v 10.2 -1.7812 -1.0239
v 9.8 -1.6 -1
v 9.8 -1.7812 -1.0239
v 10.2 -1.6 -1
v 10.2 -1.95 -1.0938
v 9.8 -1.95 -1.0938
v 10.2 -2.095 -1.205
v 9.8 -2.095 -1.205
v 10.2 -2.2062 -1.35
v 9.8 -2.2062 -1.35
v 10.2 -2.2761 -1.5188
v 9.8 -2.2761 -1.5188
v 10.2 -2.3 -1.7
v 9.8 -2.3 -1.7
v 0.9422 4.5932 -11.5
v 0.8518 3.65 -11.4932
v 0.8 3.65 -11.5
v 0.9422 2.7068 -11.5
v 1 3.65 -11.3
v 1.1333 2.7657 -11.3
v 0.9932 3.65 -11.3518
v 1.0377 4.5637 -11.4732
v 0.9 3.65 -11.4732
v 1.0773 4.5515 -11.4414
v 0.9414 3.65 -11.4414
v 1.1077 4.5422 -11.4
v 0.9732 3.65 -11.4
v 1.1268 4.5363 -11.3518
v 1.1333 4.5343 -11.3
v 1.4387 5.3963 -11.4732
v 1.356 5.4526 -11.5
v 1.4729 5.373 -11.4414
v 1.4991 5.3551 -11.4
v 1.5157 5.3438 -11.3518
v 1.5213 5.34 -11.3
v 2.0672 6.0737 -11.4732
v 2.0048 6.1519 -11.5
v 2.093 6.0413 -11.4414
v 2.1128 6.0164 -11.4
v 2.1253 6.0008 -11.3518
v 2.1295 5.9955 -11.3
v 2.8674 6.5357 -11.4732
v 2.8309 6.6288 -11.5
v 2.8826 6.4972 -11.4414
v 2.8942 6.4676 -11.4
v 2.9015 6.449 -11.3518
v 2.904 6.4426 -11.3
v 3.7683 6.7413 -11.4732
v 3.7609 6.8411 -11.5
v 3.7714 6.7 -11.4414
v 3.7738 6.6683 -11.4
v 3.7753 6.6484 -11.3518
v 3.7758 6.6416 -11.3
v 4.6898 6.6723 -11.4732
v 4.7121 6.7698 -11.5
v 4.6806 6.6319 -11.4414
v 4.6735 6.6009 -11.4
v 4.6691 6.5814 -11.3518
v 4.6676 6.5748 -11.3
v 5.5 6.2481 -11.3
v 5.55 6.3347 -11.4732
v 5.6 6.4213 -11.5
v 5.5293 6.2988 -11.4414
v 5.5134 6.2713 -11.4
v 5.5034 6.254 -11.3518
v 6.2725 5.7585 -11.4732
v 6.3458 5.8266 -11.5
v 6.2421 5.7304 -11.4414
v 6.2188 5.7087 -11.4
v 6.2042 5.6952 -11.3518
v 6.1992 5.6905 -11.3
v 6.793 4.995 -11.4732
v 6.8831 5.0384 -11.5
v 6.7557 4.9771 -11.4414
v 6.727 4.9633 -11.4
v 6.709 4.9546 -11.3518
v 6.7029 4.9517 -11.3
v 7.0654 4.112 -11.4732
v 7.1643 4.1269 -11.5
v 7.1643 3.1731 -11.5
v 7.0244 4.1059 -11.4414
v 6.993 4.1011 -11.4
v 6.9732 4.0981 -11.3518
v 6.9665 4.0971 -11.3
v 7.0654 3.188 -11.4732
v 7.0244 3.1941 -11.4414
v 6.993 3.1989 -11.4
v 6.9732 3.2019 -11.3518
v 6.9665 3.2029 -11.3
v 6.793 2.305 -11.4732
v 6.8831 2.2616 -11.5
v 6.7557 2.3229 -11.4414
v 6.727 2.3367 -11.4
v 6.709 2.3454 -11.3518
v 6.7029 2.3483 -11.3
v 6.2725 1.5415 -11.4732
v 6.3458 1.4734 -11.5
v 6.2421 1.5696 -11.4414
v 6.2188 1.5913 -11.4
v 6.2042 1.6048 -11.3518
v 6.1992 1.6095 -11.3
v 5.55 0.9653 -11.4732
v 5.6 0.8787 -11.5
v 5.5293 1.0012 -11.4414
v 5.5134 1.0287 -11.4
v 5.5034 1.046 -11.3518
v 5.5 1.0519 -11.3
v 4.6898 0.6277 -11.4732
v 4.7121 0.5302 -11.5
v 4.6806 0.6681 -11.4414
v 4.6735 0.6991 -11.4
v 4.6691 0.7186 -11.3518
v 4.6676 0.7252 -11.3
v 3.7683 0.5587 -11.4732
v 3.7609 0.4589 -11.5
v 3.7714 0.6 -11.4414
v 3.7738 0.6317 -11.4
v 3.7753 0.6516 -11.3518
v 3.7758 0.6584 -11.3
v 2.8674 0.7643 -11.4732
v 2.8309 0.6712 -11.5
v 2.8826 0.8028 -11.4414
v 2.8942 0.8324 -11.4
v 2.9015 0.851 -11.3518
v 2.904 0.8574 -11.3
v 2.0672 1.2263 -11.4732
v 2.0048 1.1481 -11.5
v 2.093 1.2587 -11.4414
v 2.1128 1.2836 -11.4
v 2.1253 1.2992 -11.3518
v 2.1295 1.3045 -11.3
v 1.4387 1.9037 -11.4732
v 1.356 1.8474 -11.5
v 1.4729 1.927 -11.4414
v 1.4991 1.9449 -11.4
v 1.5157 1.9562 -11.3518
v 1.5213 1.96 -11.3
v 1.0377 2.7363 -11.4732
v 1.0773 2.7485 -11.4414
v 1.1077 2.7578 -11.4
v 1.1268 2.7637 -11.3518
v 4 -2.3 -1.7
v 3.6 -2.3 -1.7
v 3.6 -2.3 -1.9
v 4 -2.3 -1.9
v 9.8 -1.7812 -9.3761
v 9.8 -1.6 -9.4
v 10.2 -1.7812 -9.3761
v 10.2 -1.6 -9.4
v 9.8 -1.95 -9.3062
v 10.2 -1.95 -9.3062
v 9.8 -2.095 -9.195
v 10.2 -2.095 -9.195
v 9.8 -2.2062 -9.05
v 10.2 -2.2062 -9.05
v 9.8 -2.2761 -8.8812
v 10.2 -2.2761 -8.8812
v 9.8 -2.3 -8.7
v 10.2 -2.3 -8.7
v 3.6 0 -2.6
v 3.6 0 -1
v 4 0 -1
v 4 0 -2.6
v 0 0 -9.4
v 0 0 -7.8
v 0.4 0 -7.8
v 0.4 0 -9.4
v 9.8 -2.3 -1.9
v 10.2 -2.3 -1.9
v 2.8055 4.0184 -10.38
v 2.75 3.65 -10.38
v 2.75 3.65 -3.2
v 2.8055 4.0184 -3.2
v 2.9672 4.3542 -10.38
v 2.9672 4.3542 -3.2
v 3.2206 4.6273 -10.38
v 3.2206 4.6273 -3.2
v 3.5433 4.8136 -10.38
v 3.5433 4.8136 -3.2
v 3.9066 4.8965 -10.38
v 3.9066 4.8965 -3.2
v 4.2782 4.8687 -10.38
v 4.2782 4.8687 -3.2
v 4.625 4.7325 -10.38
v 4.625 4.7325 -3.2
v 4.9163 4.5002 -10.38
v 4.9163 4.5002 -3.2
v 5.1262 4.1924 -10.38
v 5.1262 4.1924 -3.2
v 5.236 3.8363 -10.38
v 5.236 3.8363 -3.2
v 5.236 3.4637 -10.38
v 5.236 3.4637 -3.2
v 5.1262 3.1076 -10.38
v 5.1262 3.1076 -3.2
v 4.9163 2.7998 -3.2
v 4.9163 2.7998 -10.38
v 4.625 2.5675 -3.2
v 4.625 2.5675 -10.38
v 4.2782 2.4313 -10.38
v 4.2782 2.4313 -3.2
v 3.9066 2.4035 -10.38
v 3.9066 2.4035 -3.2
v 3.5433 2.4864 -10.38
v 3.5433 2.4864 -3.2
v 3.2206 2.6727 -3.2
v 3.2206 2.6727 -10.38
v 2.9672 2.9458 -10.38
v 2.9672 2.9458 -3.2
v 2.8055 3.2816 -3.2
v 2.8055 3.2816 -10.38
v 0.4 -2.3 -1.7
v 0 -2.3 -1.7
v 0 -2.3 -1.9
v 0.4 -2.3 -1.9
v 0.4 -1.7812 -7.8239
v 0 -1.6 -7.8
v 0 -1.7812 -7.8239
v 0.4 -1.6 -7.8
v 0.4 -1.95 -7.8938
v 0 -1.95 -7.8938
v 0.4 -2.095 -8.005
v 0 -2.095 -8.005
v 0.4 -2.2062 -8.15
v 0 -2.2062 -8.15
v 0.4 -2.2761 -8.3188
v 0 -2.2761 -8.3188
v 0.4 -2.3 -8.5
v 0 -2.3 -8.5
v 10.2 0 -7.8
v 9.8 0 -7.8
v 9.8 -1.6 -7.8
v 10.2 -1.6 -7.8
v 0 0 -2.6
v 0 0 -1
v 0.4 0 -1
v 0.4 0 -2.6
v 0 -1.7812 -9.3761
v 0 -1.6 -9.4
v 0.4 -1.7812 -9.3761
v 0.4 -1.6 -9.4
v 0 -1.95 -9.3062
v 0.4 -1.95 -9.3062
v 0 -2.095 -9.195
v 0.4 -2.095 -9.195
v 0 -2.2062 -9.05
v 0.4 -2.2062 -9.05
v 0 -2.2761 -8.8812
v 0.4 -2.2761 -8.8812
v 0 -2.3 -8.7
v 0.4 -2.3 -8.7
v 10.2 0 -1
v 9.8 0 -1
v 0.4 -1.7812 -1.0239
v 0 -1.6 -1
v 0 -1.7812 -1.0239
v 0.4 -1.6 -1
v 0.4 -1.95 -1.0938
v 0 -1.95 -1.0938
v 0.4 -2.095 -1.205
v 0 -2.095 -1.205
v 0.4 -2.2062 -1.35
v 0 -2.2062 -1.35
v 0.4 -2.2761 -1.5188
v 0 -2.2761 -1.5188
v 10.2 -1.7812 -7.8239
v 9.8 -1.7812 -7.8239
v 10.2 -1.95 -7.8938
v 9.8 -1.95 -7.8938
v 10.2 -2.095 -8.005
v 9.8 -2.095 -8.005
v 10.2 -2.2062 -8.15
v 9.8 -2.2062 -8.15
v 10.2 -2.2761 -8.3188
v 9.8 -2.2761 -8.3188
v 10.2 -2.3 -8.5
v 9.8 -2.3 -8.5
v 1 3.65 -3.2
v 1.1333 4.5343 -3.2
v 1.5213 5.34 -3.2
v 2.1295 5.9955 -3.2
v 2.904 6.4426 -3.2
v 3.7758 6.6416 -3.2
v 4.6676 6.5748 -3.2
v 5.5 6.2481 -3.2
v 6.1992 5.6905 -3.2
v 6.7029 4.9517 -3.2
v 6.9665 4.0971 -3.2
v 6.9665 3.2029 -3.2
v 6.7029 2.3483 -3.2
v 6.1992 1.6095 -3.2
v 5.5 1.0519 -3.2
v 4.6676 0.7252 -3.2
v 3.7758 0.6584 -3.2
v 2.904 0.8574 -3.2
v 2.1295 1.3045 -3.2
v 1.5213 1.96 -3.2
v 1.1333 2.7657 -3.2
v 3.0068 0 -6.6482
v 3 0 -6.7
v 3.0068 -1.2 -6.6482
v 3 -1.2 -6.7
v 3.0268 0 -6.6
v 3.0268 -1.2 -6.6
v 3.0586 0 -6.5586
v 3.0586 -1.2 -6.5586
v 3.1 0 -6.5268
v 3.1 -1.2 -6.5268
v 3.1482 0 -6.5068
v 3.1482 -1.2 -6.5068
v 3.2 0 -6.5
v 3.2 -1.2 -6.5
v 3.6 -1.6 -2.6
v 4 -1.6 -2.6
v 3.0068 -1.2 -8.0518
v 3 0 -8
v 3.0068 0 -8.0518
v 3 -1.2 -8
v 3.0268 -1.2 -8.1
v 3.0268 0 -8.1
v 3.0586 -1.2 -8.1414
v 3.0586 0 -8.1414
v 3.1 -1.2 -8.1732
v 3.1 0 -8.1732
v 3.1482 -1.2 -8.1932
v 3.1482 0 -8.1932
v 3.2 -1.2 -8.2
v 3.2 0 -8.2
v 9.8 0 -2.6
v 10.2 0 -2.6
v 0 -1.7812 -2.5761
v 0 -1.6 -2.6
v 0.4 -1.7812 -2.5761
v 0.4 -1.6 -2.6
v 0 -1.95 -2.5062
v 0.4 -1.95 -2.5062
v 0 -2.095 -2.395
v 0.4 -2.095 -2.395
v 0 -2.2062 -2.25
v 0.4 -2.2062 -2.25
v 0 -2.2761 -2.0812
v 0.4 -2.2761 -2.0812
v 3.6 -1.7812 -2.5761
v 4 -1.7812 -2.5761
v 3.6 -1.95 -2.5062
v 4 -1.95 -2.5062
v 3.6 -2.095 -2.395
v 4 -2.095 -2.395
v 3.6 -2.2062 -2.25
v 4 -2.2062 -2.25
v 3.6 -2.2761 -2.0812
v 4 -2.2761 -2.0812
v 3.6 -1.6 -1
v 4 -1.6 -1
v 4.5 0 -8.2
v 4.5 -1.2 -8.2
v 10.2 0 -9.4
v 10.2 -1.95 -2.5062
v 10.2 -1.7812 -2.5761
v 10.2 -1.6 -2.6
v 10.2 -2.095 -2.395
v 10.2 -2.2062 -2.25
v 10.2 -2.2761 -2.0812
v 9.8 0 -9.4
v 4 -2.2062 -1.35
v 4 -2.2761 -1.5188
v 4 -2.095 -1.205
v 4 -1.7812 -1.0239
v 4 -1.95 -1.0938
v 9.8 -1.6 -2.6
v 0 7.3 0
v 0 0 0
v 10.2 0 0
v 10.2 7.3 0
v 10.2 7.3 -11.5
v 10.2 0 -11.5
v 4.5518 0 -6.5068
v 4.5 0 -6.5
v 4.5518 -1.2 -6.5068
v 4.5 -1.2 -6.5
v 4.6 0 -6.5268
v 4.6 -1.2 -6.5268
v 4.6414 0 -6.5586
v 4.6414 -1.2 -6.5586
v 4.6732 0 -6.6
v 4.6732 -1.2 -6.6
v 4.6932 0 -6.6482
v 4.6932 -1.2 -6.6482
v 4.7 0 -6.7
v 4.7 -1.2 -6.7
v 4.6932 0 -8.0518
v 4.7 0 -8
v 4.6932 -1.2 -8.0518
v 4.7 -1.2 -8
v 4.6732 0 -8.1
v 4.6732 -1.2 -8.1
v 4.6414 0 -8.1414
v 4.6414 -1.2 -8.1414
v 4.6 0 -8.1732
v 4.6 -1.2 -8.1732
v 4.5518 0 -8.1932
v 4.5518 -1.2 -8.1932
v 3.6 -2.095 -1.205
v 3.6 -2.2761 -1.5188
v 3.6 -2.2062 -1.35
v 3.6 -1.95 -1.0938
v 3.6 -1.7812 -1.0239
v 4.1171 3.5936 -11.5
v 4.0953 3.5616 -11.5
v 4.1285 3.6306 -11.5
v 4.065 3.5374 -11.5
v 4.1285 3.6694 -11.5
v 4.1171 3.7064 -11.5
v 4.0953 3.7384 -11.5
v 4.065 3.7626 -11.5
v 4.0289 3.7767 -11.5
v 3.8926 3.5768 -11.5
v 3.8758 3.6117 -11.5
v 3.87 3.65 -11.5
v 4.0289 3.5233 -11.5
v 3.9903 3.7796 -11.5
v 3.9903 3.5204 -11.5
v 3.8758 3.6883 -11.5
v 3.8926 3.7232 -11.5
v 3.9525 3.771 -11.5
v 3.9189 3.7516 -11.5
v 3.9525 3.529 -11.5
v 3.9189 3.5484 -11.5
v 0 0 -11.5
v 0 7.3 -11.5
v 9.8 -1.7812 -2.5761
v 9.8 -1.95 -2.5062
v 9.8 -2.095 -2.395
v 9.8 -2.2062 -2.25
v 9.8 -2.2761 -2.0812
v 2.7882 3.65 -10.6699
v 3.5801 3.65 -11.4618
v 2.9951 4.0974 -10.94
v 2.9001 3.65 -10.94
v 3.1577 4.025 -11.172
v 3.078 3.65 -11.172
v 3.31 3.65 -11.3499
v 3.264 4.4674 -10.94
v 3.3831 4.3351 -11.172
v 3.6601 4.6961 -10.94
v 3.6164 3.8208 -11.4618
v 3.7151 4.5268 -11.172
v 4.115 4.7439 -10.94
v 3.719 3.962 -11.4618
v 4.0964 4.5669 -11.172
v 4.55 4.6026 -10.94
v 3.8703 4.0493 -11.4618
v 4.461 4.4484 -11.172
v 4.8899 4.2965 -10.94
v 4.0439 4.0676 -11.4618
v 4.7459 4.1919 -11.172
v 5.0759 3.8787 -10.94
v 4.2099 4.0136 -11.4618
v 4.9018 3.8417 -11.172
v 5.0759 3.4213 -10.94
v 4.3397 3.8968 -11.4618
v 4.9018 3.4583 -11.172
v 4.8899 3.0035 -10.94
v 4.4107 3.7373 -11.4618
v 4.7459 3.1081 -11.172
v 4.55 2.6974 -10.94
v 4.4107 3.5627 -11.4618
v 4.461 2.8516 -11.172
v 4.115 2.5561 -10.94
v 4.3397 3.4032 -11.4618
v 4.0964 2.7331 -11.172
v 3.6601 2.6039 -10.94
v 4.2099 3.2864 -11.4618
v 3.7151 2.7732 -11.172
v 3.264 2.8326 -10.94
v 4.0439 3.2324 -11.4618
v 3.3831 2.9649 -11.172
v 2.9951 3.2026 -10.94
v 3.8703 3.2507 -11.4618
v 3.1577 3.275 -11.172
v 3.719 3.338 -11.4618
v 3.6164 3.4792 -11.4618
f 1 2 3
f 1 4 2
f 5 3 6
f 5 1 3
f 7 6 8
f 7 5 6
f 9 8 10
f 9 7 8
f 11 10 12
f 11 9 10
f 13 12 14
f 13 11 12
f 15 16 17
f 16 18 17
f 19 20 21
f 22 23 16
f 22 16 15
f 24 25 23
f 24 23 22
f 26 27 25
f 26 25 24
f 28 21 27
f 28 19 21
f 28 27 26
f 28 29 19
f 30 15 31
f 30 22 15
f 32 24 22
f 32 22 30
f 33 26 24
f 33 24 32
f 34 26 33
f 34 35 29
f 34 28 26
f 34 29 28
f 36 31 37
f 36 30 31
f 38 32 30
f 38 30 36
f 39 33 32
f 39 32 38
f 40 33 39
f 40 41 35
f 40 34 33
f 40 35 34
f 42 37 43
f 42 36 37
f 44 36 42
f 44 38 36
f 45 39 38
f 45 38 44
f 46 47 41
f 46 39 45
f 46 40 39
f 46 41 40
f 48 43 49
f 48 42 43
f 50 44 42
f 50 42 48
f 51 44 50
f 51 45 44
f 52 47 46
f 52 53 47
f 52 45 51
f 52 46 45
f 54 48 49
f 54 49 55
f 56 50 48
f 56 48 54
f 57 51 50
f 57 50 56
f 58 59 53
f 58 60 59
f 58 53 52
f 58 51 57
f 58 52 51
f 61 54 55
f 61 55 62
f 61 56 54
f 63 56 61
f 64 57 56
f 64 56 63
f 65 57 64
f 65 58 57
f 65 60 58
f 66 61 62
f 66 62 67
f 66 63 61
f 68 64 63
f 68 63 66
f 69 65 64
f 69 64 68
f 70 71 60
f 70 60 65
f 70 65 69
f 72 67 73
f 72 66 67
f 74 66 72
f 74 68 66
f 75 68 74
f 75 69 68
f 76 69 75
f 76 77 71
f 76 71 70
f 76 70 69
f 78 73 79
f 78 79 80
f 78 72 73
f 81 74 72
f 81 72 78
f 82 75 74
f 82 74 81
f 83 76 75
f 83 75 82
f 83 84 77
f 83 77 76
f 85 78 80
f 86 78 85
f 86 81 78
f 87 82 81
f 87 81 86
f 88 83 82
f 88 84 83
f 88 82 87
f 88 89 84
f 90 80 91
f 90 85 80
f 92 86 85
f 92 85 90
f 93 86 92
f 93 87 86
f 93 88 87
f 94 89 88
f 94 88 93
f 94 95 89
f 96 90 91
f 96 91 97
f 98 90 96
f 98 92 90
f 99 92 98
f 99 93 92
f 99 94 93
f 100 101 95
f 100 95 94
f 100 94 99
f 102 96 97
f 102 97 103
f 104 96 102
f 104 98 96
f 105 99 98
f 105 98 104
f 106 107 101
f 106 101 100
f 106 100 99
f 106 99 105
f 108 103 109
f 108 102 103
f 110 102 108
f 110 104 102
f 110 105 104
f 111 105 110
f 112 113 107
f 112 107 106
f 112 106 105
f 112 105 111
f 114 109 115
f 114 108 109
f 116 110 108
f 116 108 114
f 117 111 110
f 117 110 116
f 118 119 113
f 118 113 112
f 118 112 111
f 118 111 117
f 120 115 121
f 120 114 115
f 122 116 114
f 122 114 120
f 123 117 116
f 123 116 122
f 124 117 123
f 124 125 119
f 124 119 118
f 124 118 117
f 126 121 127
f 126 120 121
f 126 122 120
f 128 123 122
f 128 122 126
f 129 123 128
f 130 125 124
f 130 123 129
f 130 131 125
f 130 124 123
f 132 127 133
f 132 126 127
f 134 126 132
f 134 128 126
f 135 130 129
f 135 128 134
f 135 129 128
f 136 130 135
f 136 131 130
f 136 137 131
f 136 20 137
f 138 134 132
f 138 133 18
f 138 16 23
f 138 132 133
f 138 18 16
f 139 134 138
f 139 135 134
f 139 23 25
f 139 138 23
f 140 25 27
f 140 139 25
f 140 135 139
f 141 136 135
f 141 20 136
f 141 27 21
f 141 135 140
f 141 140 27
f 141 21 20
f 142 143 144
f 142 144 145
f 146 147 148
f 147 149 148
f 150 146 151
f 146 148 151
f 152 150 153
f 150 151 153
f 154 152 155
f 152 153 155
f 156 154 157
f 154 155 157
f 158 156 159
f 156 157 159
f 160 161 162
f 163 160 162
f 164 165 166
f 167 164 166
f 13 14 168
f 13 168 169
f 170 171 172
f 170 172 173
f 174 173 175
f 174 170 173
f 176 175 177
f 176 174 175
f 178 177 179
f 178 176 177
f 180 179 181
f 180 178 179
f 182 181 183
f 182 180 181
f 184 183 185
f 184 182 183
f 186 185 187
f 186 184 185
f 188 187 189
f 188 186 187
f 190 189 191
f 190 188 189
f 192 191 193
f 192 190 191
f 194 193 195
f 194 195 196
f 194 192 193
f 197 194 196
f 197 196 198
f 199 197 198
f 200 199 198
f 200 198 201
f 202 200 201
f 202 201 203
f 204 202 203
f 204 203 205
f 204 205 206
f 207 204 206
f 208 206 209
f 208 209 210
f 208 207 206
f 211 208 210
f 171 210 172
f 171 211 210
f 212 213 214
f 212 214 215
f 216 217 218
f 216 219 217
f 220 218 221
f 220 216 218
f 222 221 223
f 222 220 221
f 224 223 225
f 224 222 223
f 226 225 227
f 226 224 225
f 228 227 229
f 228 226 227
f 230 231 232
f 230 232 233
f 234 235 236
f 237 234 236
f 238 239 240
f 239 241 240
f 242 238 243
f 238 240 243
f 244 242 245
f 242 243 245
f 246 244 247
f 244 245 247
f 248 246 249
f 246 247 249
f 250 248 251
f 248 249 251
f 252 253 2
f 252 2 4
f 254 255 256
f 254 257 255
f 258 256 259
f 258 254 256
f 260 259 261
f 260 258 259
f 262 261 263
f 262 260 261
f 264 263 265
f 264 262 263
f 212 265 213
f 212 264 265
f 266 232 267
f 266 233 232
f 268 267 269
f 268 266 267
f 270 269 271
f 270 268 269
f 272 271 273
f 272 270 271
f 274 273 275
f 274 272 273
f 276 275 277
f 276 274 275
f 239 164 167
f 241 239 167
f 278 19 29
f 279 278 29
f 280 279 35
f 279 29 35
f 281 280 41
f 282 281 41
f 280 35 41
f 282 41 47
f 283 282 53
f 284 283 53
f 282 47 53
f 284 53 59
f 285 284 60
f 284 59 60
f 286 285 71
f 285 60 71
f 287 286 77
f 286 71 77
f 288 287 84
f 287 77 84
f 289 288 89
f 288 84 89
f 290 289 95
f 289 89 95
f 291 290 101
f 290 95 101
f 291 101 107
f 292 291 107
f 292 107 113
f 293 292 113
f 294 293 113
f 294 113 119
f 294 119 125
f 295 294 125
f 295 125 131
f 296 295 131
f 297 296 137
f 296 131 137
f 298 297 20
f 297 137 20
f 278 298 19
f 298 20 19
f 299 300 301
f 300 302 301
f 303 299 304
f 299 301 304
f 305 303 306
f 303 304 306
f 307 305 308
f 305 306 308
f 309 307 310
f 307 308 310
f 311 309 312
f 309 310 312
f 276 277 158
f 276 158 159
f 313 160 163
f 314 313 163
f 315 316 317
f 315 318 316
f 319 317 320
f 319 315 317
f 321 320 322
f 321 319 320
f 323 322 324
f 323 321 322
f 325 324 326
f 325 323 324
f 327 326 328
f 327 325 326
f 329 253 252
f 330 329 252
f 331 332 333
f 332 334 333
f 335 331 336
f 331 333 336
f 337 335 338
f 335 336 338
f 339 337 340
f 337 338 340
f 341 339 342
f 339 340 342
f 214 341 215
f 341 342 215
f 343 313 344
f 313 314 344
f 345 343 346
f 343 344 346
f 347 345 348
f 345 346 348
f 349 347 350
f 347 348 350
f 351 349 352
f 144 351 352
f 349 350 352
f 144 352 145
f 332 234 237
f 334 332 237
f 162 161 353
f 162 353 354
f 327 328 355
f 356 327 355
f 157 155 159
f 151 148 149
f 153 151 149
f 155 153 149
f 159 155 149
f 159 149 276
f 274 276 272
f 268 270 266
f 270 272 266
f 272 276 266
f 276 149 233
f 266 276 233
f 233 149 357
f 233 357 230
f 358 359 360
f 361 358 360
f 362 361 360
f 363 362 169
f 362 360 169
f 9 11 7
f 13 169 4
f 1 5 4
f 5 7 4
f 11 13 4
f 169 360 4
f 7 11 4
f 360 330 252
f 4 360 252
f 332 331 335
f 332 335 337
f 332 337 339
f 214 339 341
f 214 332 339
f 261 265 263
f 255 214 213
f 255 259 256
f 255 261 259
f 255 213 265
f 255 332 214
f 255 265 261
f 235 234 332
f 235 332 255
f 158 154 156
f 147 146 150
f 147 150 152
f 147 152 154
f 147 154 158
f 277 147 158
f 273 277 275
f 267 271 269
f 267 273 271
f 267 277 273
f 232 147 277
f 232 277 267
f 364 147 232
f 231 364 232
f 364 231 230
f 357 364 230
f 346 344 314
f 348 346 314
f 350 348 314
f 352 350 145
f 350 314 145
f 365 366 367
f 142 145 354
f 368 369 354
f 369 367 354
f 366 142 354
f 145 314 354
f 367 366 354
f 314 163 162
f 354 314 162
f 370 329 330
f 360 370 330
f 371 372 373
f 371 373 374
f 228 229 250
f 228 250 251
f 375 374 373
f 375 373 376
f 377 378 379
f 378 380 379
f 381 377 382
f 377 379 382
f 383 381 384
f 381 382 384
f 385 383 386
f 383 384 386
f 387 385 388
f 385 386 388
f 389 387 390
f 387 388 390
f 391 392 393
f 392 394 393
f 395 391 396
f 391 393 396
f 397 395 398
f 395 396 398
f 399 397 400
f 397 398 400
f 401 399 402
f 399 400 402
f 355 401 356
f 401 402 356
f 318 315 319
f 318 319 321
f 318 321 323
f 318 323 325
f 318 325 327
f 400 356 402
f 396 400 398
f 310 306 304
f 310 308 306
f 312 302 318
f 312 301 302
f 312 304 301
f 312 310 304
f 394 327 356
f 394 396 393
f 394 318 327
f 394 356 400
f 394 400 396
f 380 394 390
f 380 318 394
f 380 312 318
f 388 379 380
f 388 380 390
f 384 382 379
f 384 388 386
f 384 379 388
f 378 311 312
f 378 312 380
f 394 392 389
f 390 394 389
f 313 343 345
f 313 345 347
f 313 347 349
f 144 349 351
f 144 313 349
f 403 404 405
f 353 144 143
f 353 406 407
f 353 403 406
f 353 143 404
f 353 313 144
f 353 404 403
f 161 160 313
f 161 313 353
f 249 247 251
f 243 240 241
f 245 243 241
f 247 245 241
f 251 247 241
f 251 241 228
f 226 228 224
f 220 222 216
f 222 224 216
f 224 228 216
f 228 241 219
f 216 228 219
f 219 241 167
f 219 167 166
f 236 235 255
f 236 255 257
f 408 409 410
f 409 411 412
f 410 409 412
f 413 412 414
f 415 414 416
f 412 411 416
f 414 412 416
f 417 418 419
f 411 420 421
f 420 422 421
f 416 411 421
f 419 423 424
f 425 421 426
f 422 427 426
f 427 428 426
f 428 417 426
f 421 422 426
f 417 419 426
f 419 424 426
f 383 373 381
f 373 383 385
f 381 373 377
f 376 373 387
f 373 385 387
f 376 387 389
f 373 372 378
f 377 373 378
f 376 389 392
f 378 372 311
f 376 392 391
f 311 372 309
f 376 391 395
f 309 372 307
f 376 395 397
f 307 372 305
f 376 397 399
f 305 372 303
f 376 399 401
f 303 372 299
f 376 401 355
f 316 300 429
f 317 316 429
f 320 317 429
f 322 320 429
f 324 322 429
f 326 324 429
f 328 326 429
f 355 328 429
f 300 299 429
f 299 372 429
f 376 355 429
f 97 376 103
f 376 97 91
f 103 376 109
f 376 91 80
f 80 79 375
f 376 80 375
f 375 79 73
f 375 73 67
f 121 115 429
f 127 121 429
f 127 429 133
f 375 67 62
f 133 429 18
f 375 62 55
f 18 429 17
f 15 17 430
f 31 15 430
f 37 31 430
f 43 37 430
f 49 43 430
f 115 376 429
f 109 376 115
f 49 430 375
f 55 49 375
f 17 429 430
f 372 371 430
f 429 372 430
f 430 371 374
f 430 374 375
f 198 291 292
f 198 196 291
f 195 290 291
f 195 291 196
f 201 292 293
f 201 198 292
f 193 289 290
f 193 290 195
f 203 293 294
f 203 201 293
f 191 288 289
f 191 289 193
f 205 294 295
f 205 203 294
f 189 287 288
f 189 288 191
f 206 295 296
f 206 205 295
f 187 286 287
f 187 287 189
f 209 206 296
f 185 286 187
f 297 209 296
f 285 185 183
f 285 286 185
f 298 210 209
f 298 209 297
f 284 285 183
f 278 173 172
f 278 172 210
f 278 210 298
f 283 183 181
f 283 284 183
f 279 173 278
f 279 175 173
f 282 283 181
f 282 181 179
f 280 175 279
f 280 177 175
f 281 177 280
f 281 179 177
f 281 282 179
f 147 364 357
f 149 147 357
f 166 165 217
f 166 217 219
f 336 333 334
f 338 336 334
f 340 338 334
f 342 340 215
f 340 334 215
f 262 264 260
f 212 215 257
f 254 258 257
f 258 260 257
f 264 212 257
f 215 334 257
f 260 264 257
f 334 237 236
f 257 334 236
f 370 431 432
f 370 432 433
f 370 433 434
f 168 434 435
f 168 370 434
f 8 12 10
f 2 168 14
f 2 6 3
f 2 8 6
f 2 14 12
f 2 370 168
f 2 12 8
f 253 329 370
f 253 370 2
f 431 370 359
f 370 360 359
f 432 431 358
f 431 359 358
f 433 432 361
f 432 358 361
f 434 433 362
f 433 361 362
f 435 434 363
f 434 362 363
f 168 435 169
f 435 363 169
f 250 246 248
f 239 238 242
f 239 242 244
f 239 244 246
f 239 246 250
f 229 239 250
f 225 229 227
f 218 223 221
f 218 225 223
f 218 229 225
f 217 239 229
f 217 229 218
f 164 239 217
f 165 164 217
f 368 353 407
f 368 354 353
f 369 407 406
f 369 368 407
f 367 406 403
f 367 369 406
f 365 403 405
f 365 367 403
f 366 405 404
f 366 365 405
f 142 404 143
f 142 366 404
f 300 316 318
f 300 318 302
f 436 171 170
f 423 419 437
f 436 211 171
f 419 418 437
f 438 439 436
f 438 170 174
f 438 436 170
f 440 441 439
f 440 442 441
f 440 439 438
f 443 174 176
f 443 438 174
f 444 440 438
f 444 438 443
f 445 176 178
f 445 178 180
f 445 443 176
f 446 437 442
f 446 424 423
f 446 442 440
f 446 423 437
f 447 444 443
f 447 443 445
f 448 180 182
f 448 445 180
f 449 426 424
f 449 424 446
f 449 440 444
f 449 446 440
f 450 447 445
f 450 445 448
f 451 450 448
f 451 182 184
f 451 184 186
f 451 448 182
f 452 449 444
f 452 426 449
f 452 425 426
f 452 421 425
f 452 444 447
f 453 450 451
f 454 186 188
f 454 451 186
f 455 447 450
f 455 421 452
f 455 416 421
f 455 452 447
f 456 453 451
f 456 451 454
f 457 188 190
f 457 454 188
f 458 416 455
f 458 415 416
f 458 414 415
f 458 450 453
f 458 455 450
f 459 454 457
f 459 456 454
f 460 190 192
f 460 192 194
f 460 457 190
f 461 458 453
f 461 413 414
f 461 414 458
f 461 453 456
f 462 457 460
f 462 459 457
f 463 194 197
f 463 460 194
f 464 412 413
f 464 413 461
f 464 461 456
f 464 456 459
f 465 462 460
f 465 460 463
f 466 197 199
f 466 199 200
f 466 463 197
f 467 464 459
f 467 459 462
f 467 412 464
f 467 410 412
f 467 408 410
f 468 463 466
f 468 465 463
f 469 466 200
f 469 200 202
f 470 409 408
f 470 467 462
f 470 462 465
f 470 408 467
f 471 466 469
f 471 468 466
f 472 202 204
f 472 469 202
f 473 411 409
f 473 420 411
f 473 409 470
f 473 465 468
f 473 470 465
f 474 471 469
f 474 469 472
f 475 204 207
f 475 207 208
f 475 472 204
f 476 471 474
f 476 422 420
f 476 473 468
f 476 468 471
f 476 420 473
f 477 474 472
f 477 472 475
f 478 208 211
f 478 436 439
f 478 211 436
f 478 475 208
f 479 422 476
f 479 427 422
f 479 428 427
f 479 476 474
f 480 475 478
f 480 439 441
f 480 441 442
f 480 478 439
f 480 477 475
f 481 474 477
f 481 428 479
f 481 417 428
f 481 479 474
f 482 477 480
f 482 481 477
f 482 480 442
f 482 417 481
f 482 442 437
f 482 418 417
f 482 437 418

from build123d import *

# Parameters (mm, degrees)
SKETCH_1_W          = 11.5
SKETCH_1_H          = 7.3
EXTRUDE_1_DEPTH     = 10.2
SKETCH_2_R          = 3
SKETCH_2_R_2        = 1.25
CUT_EXTRUDE_1_DEPTH = 8.3
FILLET_1_R          = 1.12
SKETCH_3_W          = 0.4
SKETCH_3_H          = 1.6
EXTRUDE_2_DEPTH     = 2.3
EXTRUDE_2_2_DEPTH   = 2.3
EXTRUDE_2_3_DEPTH   = 2.3
EXTRUDE_2_4_DEPTH   = 2.3
EXTRUDE_2_5_DEPTH   = 2.3
FILLET_2_R          = 0.7
FILLET_3_R          = 0.7
FILLET_4_R          = 0.7
FILLET_5_R          = 0.7
FILLET_6_R          = 0.7
SKETCH_4_W          = 1.7
SKETCH_4_H          = 1.7
EXTRUDE_3_DEPTH     = 1.2
FILLET_7_R          = 0.2
FILLET_8_R          = 0.2


with BuildPart() as part:
    # Эскиз1 → Бобышка-Вытянуть1 (new body)
    with BuildSketch(Plane(origin=(0, 0, 0), x_dir=(0, 0, -1), z_dir=(1, 0, 0))):
        with Locations((5.75, 3.65)):
            Rectangle(SKETCH_1_W, SKETCH_1_H)
    extrude(amount=EXTRUDE_1_DEPTH)

    # Эскиз2 → Вырез-Вытянуть1 (cut)
    with BuildSketch(Plane(origin=(0, 0, -11.5), x_dir=(-1, 0, 0), z_dir=(0, 0, -1))):
        with Locations((-4, 3.65)):
            Circle(SKETCH_2_R)
        with Locations((-4, 3.65)):
            Circle(SKETCH_2_R_2, mode=Mode.SUBTRACT)
    extrude(amount=-CUT_EXTRUDE_1_DEPTH, mode=Mode.SUBTRACT)

    # Скругление1
    fillet_1_edges = [part.edges().sort_by_distance(p)[0] for p in [
        (5.25, 3.65, -11.5),
    ]]
    fillet(fillet_1_edges, radius=FILLET_1_R)

    # Эскиз4 → Бобышка-Вытянуть3 (add)
    with BuildSketch(Plane.XZ):
        with Locations((3.85, -7.35)):
            Rectangle(SKETCH_4_W, SKETCH_4_H)
    extrude(amount=EXTRUDE_3_DEPTH)

    # Скругление7
    fillet_7_edges = [part.edges().sort_by_distance(p)[0] for p in [
        (3, -0.6, -6.5),
        (3, -0.6, -8.2),
        (4.7, -0.6, -8.2),
        (4.7, -0.6, -6.5),
    ]]
    fillet(fillet_7_edges, radius=FILLET_7_R)

    # Скругление8
    fillet_8_edges = [part.edges().sort_by_distance(p)[0] for p in [
        (7, 3.65, -11.5),
    ]]
    fillet(fillet_8_edges, radius=FILLET_8_R)


with BuildPart() as body_2:
    # Эскиз3 → Бобышка-Вытянуть2 (new body)
    with BuildSketch(Plane.XZ):
        with Locations((0.2, -1.8)):
            Rectangle(SKETCH_3_W, SKETCH_3_H)
    extrude(amount=EXTRUDE_2_DEPTH)

    # Скругление2
    fillet_2_edges = [body_2.edges().sort_by_distance(p)[0] for p in [
        (0.2, -2.3, -1),
        (0.2, -2.3, -2.6),
    ]]
    fillet(fillet_2_edges, radius=FILLET_2_R)


with BuildPart() as body_3:
    # Эскиз3 → Extrude 2 2 (new body)
    with BuildSketch(Plane.XZ):
        with Locations((0.2, -8.6)):
            Rectangle(SKETCH_3_W, SKETCH_3_H)
    extrude(amount=EXTRUDE_2_2_DEPTH)

    # Скругление5
    fillet_5_edges = [body_3.edges().sort_by_distance(p)[0] for p in [
        (0.2, -2.3, -7.8),
        (0.2, -2.3, -9.4),
    ]]
    fillet(fillet_5_edges, radius=FILLET_5_R)


with BuildPart() as body_4:
    # Эскиз3 → Extrude 2 3 (new body)
    with BuildSketch(Plane.XZ):
        with Locations((10, -8.6)):
            Rectangle(SKETCH_3_W, SKETCH_3_H)
    extrude(amount=EXTRUDE_2_3_DEPTH)

    # Скругление6
    fillet_6_edges = [body_4.edges().sort_by_distance(p)[0] for p in [
        (10, -2.3, -7.8),
        (10, -2.3, -9.4),
    ]]
    fillet(fillet_6_edges, radius=FILLET_6_R)


with BuildPart() as body_5:
    # Эскиз3 → Extrude 2 4 (new body)
    with BuildSketch(Plane.XZ):
        with Locations((10, -1.8)):
            Rectangle(SKETCH_3_W, SKETCH_3_H)
    extrude(amount=EXTRUDE_2_4_DEPTH)

    # Скругление4
    fillet_4_edges = [body_5.edges().sort_by_distance(p)[0] for p in [
        (10, -2.3, -1),
        (10, -2.3, -2.6),
    ]]
    fillet(fillet_4_edges, radius=FILLET_4_R)


with BuildPart() as body_6:
    # Эскиз3 → Extrude 2 5 (new body)
    with BuildSketch(Plane.XZ):
        with Locations((3.8, -1.8)):
            Rectangle(SKETCH_3_W, SKETCH_3_H)
    extrude(amount=EXTRUDE_2_5_DEPTH)

    # Скругление3
    fillet_3_edges = [body_6.edges().sort_by_distance(p)[0] for p in [
        (3.8, -2.3, -1),
        (3.8, -2.3, -2.6),
    ]]
    fillet(fillet_3_edges, radius=FILLET_3_R)


solid = Compound([part.part, body_2.part, body_3.part, body_4.part, body_5.part, body_6.part])
